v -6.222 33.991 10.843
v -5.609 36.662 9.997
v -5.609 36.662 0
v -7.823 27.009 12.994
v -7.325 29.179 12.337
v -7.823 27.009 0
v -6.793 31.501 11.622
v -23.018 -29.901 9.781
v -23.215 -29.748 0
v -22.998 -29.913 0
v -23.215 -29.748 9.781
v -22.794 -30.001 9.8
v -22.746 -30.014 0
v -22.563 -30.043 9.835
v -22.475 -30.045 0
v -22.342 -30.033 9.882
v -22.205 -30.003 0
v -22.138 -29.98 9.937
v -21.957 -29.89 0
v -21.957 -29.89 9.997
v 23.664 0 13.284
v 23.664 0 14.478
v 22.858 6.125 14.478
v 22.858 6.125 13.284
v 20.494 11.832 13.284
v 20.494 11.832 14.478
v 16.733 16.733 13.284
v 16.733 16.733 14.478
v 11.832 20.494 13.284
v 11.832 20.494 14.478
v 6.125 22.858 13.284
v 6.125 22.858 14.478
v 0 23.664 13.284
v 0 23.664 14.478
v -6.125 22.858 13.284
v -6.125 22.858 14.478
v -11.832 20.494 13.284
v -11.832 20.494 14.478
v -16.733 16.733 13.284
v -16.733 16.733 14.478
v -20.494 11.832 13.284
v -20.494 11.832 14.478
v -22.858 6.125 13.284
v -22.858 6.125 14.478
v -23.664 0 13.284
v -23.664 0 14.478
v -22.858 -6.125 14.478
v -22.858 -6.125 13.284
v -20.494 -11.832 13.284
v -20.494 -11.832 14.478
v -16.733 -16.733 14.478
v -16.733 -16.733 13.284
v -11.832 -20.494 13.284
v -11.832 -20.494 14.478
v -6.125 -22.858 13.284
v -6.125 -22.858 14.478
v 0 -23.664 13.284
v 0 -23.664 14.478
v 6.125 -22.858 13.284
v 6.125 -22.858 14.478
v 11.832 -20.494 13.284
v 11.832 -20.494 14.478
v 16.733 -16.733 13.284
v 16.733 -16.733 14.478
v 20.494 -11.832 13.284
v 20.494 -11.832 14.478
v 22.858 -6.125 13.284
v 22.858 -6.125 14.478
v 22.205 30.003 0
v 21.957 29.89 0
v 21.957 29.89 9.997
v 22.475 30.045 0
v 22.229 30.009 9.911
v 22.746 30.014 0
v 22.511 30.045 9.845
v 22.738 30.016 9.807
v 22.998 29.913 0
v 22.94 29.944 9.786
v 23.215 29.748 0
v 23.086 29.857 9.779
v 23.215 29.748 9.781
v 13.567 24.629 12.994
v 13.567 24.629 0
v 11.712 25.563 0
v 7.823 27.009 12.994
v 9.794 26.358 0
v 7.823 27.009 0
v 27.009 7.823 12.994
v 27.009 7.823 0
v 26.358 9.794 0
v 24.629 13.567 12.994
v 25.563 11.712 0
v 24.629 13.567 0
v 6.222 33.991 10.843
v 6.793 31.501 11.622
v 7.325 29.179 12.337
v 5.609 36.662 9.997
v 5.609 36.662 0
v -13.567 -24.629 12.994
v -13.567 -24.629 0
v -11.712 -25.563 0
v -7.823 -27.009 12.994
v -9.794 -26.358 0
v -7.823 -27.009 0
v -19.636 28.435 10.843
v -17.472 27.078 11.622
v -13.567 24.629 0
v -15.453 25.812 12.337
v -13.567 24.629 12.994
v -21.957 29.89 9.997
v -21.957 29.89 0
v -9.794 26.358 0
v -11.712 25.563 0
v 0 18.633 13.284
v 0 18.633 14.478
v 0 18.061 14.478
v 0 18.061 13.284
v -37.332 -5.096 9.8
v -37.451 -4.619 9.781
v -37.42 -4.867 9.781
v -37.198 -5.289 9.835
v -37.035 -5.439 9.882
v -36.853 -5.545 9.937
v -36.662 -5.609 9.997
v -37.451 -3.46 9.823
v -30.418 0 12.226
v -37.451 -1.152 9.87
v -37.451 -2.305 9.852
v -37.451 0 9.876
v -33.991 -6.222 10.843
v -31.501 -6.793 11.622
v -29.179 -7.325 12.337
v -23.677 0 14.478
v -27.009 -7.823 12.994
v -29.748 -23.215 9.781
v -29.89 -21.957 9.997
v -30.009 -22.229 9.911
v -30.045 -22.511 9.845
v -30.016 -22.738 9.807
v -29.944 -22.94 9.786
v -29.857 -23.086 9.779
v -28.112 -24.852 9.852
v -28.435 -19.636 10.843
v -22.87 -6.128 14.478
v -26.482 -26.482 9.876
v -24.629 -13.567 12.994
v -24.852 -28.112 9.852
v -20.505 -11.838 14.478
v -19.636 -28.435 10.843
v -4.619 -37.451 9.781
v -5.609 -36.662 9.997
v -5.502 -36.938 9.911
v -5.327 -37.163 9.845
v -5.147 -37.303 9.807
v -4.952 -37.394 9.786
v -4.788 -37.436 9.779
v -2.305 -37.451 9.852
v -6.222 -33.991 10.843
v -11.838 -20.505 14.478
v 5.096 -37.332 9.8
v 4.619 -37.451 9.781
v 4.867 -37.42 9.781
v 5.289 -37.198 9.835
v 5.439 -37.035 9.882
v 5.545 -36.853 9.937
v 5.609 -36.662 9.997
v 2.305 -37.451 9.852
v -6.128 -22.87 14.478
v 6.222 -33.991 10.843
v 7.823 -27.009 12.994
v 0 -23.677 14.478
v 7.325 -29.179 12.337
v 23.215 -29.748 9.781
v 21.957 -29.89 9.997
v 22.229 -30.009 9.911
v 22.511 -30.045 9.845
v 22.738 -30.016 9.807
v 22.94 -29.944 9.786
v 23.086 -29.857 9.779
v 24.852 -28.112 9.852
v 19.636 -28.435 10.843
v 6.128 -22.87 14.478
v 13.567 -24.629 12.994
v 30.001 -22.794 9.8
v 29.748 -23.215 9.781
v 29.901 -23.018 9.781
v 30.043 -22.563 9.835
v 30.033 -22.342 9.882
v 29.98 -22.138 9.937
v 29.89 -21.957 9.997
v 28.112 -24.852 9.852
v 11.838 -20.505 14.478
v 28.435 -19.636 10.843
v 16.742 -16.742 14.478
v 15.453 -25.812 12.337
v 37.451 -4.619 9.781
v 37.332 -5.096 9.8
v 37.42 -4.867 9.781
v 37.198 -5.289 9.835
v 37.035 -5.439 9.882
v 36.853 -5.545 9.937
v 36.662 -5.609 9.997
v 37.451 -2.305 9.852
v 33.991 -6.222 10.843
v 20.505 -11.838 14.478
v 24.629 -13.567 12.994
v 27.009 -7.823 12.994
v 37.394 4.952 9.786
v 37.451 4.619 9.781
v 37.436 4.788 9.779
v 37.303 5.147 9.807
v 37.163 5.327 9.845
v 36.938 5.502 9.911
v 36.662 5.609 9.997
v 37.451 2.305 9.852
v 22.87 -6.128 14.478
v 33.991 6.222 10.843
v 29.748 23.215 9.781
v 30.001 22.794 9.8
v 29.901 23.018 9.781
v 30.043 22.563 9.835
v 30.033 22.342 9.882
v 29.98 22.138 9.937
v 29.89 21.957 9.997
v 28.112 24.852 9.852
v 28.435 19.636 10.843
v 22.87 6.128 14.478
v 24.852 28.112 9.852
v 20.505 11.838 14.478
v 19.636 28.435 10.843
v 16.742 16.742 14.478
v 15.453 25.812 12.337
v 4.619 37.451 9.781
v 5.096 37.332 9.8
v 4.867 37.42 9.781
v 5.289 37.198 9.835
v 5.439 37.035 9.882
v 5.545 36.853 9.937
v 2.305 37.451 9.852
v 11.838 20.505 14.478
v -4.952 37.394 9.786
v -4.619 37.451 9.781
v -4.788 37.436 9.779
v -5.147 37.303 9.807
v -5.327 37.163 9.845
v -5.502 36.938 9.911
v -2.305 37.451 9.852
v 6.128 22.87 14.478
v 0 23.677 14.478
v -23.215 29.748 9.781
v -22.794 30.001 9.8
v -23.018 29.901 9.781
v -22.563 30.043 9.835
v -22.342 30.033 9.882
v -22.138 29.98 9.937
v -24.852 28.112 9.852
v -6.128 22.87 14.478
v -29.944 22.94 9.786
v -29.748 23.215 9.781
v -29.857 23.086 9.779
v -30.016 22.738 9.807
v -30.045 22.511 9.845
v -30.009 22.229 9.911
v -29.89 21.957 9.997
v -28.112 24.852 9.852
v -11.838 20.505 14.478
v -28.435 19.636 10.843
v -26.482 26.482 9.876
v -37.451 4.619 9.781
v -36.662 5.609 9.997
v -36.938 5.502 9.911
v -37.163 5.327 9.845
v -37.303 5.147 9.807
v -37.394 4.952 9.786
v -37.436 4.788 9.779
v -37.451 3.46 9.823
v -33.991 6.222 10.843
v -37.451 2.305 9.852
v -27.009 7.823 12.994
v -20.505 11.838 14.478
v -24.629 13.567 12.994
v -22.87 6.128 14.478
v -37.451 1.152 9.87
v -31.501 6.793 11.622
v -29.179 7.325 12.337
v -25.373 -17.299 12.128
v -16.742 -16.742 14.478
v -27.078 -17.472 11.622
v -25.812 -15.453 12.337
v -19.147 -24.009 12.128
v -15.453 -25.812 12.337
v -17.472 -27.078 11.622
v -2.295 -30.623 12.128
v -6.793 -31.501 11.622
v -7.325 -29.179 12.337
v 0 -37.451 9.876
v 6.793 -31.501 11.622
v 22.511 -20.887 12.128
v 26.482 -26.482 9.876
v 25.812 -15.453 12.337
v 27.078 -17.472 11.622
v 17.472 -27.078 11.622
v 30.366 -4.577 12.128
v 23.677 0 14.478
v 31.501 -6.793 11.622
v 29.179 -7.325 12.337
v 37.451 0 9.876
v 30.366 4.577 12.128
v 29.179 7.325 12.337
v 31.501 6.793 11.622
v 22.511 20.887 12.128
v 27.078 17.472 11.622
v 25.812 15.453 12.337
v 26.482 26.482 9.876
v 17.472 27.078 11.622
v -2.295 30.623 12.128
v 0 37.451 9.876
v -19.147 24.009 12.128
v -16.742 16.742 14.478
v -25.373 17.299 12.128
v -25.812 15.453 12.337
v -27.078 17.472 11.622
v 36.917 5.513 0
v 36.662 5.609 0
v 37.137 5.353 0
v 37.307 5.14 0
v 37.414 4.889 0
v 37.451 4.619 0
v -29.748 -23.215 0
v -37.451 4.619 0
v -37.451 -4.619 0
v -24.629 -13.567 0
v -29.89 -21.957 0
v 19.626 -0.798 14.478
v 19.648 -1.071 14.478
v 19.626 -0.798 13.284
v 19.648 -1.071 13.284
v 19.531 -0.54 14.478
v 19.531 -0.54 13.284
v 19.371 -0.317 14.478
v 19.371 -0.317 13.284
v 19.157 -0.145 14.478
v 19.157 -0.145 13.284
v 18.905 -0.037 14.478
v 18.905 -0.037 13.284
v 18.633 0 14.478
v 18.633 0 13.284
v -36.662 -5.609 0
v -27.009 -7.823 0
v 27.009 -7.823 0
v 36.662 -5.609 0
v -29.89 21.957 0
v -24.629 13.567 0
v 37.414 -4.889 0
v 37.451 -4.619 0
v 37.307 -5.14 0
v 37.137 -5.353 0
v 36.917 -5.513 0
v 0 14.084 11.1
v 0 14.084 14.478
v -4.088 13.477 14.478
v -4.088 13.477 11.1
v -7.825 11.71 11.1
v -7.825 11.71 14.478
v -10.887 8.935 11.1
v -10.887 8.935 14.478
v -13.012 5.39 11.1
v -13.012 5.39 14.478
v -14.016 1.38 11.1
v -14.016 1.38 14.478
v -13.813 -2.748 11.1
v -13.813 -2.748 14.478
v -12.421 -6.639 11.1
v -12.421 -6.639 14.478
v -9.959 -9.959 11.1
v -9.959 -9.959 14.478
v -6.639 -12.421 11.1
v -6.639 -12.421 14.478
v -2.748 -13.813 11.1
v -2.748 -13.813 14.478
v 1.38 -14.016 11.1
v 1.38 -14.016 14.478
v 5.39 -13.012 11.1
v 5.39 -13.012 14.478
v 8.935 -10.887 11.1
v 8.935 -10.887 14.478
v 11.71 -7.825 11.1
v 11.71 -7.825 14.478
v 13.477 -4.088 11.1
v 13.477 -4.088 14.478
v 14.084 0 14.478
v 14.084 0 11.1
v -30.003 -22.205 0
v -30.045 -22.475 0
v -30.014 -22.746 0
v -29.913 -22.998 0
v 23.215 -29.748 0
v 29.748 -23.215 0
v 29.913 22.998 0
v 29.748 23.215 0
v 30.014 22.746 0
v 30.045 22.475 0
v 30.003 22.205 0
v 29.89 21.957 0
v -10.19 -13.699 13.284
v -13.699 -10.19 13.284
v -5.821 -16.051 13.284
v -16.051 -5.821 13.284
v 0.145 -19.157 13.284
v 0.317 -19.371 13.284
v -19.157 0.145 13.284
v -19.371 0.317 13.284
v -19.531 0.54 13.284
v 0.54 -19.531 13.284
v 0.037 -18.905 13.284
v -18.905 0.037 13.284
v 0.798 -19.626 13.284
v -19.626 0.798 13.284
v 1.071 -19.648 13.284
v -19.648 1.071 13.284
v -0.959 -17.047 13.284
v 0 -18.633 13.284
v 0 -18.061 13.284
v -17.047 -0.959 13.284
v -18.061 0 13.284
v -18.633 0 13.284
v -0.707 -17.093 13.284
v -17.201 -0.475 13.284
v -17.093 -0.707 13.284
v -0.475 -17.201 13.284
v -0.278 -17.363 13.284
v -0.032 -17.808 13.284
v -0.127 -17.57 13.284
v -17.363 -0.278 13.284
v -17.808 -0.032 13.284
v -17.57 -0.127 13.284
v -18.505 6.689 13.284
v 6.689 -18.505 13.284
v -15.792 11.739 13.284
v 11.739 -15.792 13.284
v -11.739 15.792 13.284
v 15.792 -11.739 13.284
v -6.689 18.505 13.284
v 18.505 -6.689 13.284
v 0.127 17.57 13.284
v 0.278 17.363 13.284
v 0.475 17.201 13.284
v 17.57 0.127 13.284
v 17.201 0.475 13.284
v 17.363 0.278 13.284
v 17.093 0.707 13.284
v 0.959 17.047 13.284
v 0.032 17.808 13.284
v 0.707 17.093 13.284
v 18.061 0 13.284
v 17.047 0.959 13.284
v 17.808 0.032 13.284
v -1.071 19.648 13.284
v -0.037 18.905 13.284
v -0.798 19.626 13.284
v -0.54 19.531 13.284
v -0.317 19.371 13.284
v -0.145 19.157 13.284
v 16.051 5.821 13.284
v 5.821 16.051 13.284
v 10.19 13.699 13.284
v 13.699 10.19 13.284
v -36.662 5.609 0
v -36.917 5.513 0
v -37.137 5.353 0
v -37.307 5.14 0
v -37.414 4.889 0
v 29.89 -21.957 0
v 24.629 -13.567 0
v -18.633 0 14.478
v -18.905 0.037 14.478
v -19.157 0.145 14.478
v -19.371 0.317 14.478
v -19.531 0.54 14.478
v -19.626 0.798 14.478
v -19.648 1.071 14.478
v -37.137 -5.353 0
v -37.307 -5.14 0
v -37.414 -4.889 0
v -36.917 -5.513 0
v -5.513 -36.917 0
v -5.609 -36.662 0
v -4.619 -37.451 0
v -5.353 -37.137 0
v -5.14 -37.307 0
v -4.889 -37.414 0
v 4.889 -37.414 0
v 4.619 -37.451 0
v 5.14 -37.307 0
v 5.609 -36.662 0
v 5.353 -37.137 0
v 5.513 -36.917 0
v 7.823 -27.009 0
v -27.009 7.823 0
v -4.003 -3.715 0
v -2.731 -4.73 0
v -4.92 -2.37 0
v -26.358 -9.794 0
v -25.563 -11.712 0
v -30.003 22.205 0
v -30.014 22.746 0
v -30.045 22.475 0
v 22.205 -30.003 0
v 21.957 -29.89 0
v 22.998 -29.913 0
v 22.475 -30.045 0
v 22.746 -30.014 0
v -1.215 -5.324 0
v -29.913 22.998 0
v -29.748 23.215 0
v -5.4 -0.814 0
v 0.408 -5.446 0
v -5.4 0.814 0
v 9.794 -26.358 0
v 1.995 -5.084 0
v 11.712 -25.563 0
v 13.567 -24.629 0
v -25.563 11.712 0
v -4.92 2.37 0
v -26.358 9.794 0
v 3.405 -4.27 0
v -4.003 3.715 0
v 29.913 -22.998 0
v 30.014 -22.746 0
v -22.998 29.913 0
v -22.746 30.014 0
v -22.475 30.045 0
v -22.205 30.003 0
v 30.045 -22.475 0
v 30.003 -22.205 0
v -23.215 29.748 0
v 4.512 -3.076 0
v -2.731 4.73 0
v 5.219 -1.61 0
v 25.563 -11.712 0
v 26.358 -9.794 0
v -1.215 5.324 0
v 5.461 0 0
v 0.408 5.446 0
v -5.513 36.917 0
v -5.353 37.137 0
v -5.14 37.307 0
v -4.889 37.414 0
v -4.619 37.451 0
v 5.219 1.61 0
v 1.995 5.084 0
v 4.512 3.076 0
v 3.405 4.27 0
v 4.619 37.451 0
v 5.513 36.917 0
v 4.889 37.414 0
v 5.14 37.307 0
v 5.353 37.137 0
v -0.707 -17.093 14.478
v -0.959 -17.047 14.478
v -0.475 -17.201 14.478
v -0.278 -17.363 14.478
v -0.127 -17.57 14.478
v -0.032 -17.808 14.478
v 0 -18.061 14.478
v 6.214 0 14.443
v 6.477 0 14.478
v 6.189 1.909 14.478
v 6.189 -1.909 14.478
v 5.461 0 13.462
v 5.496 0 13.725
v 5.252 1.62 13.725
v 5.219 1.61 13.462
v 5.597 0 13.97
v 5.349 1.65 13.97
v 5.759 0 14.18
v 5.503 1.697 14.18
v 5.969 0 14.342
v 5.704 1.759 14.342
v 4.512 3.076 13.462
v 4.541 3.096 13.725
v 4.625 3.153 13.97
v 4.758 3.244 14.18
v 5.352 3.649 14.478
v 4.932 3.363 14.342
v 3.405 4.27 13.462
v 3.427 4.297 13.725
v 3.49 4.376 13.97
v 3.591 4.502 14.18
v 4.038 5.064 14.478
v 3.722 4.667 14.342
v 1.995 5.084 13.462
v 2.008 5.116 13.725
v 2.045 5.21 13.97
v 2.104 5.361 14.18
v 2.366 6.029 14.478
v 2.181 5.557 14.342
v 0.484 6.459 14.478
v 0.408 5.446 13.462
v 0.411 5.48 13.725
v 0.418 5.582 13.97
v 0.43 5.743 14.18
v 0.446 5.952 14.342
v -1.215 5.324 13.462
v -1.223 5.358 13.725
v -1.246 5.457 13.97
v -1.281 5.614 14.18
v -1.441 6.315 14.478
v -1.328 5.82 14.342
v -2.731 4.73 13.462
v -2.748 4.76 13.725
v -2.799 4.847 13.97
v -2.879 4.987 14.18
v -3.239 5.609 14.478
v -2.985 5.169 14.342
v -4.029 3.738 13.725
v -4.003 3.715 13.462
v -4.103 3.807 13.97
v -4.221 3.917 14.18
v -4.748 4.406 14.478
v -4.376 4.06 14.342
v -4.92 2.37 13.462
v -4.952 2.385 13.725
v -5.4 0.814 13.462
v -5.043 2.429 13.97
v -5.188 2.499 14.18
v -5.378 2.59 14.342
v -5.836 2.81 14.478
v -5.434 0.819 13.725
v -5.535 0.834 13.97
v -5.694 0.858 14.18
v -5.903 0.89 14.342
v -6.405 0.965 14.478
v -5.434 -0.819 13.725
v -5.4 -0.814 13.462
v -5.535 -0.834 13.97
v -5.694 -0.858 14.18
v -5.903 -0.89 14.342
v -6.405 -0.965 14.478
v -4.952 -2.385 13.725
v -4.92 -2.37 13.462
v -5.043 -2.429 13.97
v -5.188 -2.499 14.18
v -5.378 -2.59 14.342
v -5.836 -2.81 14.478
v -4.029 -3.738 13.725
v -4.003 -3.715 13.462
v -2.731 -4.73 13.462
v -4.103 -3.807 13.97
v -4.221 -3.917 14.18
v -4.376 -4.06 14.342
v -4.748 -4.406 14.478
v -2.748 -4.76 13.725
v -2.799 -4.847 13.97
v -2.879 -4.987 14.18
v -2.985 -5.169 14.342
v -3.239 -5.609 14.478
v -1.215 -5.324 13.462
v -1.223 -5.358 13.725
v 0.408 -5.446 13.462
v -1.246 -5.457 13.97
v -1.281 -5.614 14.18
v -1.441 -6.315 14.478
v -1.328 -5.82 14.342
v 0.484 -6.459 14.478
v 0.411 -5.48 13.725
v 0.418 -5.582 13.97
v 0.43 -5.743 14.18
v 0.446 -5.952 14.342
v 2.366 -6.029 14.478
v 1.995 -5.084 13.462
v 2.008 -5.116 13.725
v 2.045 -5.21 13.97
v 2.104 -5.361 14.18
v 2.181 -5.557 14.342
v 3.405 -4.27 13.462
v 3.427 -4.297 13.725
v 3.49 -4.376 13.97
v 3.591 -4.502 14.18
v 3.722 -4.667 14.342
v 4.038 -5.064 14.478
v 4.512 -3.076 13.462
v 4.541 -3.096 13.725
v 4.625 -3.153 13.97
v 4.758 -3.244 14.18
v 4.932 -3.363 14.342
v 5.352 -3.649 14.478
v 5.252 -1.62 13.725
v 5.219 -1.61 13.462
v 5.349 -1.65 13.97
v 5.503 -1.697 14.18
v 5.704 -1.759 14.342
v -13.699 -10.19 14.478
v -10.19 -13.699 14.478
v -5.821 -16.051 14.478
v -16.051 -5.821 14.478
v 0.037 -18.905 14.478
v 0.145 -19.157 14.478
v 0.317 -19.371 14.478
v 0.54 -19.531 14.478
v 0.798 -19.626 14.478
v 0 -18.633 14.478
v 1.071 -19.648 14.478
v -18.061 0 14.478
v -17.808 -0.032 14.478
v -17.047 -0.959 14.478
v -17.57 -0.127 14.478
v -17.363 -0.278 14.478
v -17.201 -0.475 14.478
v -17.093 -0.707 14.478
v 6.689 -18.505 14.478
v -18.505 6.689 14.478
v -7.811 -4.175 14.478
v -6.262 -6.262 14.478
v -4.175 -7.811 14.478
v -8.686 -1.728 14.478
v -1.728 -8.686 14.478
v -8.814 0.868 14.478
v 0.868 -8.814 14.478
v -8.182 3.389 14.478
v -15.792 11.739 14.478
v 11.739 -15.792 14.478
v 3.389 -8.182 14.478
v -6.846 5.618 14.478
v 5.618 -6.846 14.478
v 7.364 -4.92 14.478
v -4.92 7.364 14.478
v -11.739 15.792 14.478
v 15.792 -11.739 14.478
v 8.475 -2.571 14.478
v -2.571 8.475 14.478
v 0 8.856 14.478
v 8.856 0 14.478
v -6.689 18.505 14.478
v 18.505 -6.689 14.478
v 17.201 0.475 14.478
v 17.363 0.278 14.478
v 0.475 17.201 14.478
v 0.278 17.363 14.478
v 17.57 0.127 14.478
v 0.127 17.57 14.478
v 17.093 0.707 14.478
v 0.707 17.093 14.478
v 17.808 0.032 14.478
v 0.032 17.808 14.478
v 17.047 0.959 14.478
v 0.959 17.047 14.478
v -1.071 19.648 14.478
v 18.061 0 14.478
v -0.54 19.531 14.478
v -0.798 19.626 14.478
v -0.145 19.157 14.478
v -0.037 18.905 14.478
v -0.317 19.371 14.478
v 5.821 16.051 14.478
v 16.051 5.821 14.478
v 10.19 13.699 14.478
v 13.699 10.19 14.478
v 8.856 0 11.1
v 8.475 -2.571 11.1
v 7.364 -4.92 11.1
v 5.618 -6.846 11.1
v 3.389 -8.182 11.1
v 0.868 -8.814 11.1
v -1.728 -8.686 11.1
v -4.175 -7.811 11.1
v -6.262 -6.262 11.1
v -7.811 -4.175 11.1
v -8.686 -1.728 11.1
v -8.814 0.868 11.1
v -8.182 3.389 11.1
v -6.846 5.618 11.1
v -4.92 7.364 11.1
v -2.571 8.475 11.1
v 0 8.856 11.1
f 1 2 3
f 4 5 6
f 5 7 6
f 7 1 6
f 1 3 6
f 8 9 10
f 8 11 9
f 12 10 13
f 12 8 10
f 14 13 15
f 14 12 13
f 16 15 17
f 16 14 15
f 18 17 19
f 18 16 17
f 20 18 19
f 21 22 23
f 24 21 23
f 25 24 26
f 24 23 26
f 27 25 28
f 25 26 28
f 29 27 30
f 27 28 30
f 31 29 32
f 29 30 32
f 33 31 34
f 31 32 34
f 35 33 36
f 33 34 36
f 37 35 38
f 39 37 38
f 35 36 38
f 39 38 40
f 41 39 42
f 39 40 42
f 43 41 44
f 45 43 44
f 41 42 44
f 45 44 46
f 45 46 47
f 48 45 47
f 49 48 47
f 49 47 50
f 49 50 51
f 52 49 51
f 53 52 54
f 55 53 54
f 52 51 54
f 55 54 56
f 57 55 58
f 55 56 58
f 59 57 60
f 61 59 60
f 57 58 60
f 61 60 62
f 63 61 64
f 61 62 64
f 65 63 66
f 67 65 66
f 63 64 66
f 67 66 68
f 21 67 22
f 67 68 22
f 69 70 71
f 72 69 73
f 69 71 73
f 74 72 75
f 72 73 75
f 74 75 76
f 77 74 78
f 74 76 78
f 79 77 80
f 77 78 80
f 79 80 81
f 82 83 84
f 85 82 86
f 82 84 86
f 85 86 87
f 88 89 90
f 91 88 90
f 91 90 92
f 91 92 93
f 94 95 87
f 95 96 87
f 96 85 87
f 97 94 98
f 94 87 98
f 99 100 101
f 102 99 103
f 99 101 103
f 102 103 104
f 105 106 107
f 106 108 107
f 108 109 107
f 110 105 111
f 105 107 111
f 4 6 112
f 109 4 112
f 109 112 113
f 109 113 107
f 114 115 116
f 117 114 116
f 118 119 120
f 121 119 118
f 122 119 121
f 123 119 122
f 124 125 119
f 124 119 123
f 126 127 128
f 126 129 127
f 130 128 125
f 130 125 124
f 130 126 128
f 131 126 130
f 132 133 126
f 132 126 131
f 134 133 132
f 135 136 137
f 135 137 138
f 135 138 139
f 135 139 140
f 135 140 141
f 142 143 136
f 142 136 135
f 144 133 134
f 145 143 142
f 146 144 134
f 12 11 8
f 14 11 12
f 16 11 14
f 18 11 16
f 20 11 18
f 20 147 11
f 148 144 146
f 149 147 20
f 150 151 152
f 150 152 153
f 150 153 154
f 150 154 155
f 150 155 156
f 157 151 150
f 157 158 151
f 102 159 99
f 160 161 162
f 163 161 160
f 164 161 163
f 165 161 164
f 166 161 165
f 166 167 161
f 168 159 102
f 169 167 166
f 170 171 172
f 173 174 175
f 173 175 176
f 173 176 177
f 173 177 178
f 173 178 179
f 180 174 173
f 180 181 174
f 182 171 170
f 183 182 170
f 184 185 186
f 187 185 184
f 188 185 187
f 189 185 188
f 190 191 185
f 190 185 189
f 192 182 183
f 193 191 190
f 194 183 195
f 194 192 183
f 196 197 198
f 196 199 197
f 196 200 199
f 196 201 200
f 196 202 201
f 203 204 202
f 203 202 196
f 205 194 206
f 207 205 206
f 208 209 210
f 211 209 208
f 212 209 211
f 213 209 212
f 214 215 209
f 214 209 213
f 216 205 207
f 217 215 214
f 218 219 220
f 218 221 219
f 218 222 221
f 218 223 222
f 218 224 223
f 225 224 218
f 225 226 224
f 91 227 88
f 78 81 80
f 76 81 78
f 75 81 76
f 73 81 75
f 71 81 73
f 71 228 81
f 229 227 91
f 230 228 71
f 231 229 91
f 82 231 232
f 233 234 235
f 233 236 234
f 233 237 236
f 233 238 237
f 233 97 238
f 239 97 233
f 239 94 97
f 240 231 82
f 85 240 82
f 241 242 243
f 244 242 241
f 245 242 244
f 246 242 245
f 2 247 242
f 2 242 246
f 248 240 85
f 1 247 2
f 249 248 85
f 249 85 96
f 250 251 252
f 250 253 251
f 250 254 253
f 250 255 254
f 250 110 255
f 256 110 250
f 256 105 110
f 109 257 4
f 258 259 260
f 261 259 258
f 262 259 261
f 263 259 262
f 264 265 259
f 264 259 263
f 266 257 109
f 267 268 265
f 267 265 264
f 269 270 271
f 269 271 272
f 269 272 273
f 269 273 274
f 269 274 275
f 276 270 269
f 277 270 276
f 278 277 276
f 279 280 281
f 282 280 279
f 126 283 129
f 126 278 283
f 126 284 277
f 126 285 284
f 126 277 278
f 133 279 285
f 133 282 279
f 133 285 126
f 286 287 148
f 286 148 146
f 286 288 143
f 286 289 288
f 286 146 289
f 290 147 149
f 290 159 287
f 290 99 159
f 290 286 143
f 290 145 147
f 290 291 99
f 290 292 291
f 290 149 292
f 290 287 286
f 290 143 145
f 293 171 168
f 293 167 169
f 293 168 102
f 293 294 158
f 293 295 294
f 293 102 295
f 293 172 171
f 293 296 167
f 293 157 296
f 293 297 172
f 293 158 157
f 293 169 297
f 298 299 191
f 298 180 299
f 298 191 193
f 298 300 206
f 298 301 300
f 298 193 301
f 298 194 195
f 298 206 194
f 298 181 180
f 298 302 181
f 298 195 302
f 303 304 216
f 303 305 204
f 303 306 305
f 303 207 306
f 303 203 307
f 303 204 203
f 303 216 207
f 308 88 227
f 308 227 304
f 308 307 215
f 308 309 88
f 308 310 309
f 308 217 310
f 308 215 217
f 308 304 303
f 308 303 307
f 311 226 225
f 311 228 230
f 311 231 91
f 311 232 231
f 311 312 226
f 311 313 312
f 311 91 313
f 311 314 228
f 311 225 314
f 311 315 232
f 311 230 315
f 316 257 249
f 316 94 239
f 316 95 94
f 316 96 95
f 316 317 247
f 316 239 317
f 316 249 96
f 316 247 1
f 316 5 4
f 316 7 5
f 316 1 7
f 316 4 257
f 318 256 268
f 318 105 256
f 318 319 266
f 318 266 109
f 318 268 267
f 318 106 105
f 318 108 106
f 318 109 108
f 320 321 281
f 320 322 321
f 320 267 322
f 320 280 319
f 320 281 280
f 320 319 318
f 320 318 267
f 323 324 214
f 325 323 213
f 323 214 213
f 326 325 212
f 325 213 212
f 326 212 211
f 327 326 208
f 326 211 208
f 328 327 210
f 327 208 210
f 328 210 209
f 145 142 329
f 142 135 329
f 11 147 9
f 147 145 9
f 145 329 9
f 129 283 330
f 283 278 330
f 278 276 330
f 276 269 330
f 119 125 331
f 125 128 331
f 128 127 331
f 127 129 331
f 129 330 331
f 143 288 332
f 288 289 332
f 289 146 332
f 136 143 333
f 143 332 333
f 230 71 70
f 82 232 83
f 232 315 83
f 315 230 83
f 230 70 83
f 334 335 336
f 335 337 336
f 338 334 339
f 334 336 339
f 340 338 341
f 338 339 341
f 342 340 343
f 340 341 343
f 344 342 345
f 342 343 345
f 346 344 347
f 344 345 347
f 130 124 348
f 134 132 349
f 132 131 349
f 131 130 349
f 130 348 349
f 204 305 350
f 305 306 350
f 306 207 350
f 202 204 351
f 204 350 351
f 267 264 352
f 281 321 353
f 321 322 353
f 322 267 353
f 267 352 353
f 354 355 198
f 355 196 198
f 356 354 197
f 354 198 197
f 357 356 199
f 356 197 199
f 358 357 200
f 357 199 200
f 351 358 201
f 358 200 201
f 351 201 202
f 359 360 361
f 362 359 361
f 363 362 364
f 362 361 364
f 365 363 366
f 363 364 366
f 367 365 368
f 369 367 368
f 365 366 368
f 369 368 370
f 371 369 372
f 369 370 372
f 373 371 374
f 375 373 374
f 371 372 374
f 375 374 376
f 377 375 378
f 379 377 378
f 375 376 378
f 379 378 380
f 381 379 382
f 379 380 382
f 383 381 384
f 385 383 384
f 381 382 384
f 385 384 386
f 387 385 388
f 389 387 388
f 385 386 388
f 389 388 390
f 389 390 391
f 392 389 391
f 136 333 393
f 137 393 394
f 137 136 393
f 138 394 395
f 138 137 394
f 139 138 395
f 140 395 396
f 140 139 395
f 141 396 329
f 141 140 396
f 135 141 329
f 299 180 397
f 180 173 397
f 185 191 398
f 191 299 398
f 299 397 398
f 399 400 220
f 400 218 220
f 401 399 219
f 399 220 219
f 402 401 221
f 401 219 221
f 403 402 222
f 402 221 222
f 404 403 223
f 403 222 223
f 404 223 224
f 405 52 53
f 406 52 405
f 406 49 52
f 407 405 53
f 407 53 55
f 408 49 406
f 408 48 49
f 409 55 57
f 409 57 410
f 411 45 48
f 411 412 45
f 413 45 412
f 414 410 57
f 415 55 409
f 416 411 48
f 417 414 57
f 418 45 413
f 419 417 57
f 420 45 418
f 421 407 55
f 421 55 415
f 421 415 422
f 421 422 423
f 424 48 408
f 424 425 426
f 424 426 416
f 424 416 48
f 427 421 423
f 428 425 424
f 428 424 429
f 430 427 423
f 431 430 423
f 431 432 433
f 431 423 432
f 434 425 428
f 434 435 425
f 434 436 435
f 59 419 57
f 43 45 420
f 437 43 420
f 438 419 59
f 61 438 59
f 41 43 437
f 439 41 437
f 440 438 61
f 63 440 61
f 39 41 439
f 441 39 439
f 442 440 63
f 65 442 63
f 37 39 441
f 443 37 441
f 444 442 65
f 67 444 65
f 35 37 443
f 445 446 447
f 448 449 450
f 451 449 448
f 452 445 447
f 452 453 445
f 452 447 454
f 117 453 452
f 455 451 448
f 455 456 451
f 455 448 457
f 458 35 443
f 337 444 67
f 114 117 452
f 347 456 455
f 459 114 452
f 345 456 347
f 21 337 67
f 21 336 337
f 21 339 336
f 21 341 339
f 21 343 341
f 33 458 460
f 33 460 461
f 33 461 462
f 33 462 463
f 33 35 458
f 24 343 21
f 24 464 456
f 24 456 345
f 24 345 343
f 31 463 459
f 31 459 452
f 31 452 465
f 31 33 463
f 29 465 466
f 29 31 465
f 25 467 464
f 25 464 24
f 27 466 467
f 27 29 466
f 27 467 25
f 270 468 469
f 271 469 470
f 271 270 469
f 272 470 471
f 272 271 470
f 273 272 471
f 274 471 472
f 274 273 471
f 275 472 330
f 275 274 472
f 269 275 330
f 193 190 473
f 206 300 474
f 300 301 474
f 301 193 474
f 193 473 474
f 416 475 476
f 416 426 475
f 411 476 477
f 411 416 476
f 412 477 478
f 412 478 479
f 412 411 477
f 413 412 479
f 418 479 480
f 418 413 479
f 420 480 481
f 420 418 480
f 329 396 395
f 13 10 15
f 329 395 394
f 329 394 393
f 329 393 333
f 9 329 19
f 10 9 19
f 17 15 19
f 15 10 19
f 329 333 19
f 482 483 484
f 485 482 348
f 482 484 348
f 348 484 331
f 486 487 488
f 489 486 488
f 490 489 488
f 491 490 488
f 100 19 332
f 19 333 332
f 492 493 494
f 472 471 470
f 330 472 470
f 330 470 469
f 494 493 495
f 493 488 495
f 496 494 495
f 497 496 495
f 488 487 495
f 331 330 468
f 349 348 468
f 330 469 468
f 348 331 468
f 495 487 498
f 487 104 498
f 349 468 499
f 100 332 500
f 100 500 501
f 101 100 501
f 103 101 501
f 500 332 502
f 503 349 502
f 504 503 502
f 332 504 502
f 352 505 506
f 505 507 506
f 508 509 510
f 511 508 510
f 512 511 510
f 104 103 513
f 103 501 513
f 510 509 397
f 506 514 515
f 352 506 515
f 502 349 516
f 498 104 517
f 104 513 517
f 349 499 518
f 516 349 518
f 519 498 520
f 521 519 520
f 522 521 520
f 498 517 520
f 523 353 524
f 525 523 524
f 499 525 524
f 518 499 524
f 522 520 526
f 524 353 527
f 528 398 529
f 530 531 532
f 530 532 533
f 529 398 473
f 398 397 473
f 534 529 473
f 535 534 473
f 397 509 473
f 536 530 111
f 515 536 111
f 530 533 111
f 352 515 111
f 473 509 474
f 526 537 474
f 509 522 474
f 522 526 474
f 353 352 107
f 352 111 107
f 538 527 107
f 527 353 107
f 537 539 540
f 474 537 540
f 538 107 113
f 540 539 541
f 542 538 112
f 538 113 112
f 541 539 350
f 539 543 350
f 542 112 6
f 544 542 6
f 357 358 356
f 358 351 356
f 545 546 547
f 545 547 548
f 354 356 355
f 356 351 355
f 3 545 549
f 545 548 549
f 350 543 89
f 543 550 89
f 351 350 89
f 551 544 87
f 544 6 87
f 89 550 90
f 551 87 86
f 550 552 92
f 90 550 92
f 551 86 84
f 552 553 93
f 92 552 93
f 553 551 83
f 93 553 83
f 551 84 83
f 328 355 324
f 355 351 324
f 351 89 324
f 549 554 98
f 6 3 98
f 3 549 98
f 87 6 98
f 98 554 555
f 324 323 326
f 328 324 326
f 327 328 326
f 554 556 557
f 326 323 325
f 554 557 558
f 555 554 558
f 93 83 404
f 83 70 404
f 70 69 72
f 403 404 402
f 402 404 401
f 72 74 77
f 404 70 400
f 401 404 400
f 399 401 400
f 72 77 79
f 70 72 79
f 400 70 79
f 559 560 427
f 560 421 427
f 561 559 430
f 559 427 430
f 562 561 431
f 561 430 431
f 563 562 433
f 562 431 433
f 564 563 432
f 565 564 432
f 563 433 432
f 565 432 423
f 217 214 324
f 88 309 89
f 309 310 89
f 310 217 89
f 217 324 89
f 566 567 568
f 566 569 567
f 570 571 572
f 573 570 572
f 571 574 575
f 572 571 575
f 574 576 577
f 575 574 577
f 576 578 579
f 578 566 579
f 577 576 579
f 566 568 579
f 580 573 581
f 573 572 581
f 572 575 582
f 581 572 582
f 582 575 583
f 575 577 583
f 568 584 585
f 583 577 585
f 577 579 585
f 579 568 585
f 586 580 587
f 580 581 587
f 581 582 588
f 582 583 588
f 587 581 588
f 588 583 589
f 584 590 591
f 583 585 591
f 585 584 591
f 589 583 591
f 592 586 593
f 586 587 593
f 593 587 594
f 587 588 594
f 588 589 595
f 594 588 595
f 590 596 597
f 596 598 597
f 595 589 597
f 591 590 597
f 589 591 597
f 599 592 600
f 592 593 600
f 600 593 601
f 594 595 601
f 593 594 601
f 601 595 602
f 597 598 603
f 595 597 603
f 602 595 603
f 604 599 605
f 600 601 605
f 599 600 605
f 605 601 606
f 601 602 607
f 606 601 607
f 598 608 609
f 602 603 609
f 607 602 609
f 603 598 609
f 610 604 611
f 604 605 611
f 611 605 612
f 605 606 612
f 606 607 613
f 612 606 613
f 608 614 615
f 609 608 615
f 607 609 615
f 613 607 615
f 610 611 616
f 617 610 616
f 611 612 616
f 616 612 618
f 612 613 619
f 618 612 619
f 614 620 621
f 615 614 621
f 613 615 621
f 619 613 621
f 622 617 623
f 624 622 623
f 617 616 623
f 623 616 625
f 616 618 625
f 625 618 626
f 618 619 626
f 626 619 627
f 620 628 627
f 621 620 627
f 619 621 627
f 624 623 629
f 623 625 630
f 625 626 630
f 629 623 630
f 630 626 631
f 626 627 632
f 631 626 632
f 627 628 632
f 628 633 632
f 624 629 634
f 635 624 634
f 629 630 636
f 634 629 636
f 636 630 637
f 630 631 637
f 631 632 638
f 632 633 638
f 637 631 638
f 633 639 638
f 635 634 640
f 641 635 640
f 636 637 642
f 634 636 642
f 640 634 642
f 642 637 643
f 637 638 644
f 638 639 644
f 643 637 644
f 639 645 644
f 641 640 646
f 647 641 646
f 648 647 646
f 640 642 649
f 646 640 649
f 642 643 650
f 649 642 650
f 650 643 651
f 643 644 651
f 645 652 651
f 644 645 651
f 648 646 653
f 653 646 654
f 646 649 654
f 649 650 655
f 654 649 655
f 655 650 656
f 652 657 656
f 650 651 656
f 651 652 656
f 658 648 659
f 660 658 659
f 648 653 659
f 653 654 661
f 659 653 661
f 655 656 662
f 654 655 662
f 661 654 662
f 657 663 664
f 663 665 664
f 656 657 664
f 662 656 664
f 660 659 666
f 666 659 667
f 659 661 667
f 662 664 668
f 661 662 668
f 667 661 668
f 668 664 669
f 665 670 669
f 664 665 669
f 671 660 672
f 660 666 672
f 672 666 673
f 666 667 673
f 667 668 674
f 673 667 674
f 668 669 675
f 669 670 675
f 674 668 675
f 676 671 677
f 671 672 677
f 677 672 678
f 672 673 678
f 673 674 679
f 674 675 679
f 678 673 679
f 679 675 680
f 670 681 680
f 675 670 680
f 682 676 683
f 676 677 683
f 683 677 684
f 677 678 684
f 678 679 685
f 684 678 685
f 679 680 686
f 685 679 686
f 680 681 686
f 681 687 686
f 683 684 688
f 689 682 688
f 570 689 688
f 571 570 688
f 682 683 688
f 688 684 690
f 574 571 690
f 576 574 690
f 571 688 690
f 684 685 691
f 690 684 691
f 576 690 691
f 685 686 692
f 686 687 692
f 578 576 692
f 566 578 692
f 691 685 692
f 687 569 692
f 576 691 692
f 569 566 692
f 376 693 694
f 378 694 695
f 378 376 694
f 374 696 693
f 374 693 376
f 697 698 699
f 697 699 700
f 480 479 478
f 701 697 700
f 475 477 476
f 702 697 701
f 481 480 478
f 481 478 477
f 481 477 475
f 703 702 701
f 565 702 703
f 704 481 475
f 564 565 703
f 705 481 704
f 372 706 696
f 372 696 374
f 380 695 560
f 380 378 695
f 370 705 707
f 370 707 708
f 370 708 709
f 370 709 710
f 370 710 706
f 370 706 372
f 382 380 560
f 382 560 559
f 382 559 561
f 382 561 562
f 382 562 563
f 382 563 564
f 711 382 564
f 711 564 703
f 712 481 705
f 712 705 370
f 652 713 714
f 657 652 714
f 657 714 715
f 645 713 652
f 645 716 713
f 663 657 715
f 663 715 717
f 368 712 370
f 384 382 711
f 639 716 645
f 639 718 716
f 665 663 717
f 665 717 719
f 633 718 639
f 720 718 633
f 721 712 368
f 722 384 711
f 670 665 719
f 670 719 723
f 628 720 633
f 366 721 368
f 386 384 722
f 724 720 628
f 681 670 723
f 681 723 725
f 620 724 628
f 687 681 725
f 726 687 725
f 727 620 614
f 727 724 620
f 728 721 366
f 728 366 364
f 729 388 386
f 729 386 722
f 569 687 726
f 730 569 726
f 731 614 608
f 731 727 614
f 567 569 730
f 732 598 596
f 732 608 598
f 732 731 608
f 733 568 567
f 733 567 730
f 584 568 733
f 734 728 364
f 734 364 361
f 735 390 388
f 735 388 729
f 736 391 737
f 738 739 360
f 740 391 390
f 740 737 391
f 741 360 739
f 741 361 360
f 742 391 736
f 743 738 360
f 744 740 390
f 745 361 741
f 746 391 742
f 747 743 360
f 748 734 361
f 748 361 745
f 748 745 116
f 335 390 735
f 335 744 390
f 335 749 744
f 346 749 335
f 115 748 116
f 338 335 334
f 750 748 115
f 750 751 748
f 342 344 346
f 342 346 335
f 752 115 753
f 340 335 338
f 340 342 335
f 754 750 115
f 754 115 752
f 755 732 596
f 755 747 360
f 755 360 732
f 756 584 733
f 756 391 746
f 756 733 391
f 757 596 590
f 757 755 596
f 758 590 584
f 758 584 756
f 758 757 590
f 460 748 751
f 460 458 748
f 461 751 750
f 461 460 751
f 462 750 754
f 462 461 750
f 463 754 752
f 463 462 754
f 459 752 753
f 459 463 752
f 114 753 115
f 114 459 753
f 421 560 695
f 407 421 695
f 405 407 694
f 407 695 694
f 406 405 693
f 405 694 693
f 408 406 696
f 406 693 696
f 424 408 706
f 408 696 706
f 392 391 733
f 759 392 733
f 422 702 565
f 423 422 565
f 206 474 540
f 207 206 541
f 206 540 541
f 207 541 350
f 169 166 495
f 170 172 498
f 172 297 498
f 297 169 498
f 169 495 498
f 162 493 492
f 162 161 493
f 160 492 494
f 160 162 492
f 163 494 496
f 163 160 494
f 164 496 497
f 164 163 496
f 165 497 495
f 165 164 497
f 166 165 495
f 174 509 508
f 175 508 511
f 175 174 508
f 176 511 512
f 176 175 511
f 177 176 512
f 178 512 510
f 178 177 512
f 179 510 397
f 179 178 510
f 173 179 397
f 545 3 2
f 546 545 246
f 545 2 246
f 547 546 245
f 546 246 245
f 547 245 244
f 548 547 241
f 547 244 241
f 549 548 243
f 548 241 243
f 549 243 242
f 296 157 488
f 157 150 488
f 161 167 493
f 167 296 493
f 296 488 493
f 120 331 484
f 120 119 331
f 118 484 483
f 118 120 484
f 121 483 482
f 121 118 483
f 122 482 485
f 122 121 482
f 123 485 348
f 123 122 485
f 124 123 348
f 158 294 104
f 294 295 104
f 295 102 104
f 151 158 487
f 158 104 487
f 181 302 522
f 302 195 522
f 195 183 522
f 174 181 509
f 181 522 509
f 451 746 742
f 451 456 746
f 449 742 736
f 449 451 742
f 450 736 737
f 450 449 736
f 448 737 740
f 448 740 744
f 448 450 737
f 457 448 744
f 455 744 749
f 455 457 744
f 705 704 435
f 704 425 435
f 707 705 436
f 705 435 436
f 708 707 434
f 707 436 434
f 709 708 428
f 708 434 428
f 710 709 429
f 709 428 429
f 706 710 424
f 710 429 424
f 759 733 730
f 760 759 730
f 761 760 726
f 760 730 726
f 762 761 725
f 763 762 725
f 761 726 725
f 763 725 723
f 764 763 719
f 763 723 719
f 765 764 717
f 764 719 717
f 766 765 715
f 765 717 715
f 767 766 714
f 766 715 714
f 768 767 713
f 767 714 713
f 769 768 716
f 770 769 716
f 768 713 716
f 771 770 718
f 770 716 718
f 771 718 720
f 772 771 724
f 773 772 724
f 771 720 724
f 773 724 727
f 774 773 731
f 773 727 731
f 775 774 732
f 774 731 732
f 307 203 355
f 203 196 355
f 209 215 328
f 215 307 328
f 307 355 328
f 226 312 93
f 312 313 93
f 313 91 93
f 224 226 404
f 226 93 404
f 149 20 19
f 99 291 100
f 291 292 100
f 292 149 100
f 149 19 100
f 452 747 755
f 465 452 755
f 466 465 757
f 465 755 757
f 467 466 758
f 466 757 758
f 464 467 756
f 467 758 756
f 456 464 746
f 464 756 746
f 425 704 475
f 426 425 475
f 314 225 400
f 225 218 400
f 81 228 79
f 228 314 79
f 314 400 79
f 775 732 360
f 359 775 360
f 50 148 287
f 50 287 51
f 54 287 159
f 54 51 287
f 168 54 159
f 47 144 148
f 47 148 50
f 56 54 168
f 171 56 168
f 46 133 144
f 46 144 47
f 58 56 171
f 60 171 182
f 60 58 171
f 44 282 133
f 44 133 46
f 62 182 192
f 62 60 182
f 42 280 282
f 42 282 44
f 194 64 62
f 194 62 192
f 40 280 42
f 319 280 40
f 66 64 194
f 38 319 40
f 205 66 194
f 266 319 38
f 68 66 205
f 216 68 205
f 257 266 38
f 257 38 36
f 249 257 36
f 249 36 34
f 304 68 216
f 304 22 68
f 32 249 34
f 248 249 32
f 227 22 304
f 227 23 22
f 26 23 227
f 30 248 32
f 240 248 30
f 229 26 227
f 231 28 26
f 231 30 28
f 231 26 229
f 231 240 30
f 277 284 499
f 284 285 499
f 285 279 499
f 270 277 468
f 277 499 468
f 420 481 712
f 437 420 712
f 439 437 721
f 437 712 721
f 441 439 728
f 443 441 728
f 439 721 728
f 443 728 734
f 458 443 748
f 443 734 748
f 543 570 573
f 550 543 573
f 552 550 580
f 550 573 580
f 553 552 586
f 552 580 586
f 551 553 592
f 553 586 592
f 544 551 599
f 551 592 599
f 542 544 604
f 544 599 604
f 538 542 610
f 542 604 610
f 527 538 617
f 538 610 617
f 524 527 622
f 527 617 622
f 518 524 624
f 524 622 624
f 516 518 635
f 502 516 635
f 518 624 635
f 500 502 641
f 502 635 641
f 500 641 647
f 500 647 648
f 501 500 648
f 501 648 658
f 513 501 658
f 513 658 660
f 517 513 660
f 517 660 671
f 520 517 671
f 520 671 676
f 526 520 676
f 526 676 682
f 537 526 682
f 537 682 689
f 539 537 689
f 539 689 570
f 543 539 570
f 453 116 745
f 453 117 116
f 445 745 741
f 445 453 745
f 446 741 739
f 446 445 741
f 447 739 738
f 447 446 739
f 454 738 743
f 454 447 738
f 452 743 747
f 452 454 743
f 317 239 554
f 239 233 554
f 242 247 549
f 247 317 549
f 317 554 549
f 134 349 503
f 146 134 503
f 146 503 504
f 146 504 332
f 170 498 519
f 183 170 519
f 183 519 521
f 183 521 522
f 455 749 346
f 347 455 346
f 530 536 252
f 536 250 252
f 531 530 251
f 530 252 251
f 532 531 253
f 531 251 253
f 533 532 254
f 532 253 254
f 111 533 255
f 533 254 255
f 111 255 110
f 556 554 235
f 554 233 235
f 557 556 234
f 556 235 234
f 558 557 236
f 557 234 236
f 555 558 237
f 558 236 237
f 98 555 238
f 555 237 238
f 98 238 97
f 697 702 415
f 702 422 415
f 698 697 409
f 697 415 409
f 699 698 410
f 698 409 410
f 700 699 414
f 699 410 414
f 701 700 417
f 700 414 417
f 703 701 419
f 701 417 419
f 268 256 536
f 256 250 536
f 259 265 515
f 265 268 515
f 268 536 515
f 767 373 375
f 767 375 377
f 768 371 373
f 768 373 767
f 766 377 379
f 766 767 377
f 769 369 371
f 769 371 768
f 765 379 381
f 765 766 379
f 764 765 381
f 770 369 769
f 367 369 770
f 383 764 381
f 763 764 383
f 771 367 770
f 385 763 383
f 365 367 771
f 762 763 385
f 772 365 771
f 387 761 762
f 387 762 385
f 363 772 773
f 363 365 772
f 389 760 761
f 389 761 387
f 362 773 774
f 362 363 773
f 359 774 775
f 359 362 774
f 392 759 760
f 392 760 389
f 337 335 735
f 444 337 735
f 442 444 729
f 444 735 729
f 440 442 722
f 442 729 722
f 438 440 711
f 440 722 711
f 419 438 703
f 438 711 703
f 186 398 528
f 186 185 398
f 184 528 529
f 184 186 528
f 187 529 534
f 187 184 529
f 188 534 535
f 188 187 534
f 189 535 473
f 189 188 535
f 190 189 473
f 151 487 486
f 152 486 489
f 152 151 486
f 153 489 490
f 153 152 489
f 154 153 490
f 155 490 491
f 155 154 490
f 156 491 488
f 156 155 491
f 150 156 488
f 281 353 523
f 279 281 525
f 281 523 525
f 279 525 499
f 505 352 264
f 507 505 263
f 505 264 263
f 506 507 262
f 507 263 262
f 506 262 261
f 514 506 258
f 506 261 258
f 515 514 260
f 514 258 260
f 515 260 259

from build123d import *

# Parameters (mm, degrees)
F1_DEPTH = 14.478
F5_R     = 23.6640826147
F6_DEPTH = 1.1938
F5_R_2   = 5.4611807343
F7_DEPTH = 18.034
F8_DEPTH = 3.3782
F9_R     = 1.016


with BuildPart() as f1:
    # F0 (on Top) → F1 (new body)
    with BuildSketch(Plane.XY):
        with BuildLine():
            Line((-30.3200407773, 22.6429850771), (-24.6294784274, 13.5667208411))
            ThreePointArc((-24.6294784274, 13.5667208411), (-25.9783872248, 10.7606003171), (-27.0087915183, 7.8225509079))
            Line((-27.0087915183, 7.8225509079), (-37.4505147338, 5.4284981452))
            Line((-37.4505147338, 5.4284981452), (-37.4505147338, -5.4284981452))
            Line((-37.4505147338, -5.4284981452), (-27.0087915183, -7.8225509079))
            ThreePointArc((-27.0087915183, -7.8225509079), (-25.9783872248, -10.7606003171), (-24.6294784274, -13.5667208411))
            Line((-24.6294784274, -13.5667208411), (-30.3200407773, -22.6429850771))
            Line((-30.3200407773, -22.6429850771), (-22.6429850771, -30.3200407773))
            Line((-22.6429850771, -30.3200407773), (-13.5667208411, -24.6294784274))
            ThreePointArc((-13.5667208411, -24.6294784274), (-10.7606003171, -25.9783872248), (-7.8225509079, -27.0087915183))
            Line((-7.8225509079, -27.0087915183), (-5.4284981452, -37.4505147338))
            Line((-5.4284981452, -37.4505147338), (5.4284981452, -37.4505147338))
            Line((5.4284981452, -37.4505147338), (7.8225509079, -27.0087915183))
            ThreePointArc((7.8225509079, -27.0087915183), (10.7606003171, -25.9783872248), (13.5667208411, -24.6294784274))
            Line((13.5667208411, -24.6294784274), (22.6429850771, -30.3200407773))
            Line((22.6429850771, -30.3200407773), (30.3200407773, -22.6429850771))
            Line((30.3200407773, -22.6429850771), (24.6294784274, -13.5667208411))
            ThreePointArc((24.6294784274, -13.5667208411), (25.9783872248, -10.7606003171), (27.0087915183, -7.8225509079))
            Line((27.0087915183, -7.8225509079), (37.4505147338, -5.4284981452))
            Line((37.4505147338, -5.4284981452), (37.4505147338, 5.4284981452))
            Line((37.4505147338, 5.4284981452), (27.0087915183, 7.8225509079))
            ThreePointArc((27.0087915183, 7.8225509079), (25.9783872248, 10.7606003171), (24.6294784274, 13.5667208411))
            Line((24.6294784274, 13.5667208411), (30.3200407773, 22.6429850771))
            Line((30.3200407773, 22.6429850771), (22.6429850771, 30.3200407773))
            Line((22.6429850771, 30.3200407773), (13.5667208411, 24.6294784274))
            ThreePointArc((13.5667208411, 24.6294784274), (10.7606003171, 25.9783872248), (7.8225509079, 27.0087915183))
            Line((7.8225509079, 27.0087915183), (5.4284981452, 37.4505147338))
            Line((5.4284981452, 37.4505147338), (-5.4284981452, 37.4505147338))
            Line((-5.4284981452, 37.4505147338), (-7.8225509079, 27.0087915183))
            ThreePointArc((-7.8225509079, 27.0087915183), (-10.7606003171, 25.9783872248), (-13.5667208411, 24.6294784274))
            Line((-13.5667208411, 24.6294784274), (-22.6429850771, 30.3200407773))
            Line((-22.6429850771, 30.3200407773), (-30.3200407773, 22.6429850771))
        make_face()
    extrude(amount=F1_DEPTH)

    # F3 (on Front) → F4 (revolve, cut)
    with BuildSketch(Plane.XZ):
        Polygon((-39.187733084, 17.5162125379), (-39.187733084, 9.2955380678), (-23.6767126761, 14.478), (-23.6767126761, 17.5162125379), align=None)
    revolve(axis=Axis((0, 0, 21.3634204119), (0, 0, 1)), mode=Mode.SUBTRACT)

    # F5 (on face) → F6 (cut)
    with BuildSketch(Plane.XY.offset(14.478)):
        Circle(F5_R)
        with BuildLine():
            ThreePointArc((-19.6771575376, 0), (-13.9138515293, 13.9138515293), (0, 19.6771575376))
            Line((0, 19.6771575376), (0, 17.0739562129))
            ThreePointArc((0, 17.0739562129), (12.0731102199, 12.0731102199), (17.0739562129, 0))
            Line((17.0739562129, 0), (19.6771575376, 0))
            ThreePointArc((19.6771575376, 0), (13.9138515293, -13.9138515293), (0, -19.6771575376))
            Line((0, -19.6771575376), (0, -17.0739562129))
            ThreePointArc((0, -17.0739562129), (-12.0731102199, -12.0731102199), (-17.0739562129, 0))
            Line((-17.0739562129, 0), (-19.6771575376, 0))
        make_face(mode=Mode.SUBTRACT)
    extrude(amount=-F6_DEPTH, mode=Mode.SUBTRACT)

    # F5 (on face) → F7 (cut)
    with BuildSketch(Plane.XY.offset(14.478)):
        Circle(F5_R_2)
    extrude(amount=-F7_DEPTH, mode=Mode.SUBTRACT)

    # F5 (on face) → F8 (cut)
    with BuildSketch(Plane.XY.offset(14.478)):
        with BuildLine():
            Line((0, 8.8564318695), (0, 14.0838984666))
            ThreePointArc((0, 14.0838984666), (-9.9588201113, -9.9588201113), (14.0838984666, 0))
            Line((14.0838984666, 0), (8.8564318695, 0))
            ThreePointArc((8.8564318695, 0), (-6.262443032, -6.262443032), (0, 8.8564318695))
        make_face()
    extrude(amount=-F8_DEPTH, mode=Mode.SUBTRACT)

    # F9
    f9_edges = [f1.edges().sort_by_distance(p)[0] for p in [
        (-37.450515, -5.428498, 4.8726),
        (-37.450515, 5.428498, 4.8726),
        (-30.320041, -22.642985, 4.8726),
        (-22.642985, -30.320041, 4.8726),
        (-5.428498, -37.450515, 4.8726),
        (5.428498, -37.450515, 4.8726),
        (22.642985, -30.320041, 4.8726),
        (30.320041, -22.642985, 4.8726),
        (37.450515, -5.428498, 4.8726),
        (37.450515, 5.428498, 4.8726),
        (30.320041, 22.642985, 4.8726),
        (22.642985, 30.320041, 4.8726),
        (5.428498, 37.450515, 4.8726),
        (-5.428498, 37.450515, 4.8726),
        (-30.320041, 22.642985, 4.8726),
        (-22.642985, 30.320041, 4.8726),
        (19.677158, 0, 13.8811),
        (17.073956, 0, 13.8811),
        (0, 17.073956, 13.8811),
        (0, 19.677158, 13.8811),
        (-5.461181, 0, 14.478),
        (-19.677158, 0, 13.8811),
        (-17.073956, 0, 13.8811),
        (0, -19.677158, 13.8811),
        (0, -17.073956, 13.8811),
    ]]
    fillet(f9_edges, radius=F9_R)


solid = f1.part
